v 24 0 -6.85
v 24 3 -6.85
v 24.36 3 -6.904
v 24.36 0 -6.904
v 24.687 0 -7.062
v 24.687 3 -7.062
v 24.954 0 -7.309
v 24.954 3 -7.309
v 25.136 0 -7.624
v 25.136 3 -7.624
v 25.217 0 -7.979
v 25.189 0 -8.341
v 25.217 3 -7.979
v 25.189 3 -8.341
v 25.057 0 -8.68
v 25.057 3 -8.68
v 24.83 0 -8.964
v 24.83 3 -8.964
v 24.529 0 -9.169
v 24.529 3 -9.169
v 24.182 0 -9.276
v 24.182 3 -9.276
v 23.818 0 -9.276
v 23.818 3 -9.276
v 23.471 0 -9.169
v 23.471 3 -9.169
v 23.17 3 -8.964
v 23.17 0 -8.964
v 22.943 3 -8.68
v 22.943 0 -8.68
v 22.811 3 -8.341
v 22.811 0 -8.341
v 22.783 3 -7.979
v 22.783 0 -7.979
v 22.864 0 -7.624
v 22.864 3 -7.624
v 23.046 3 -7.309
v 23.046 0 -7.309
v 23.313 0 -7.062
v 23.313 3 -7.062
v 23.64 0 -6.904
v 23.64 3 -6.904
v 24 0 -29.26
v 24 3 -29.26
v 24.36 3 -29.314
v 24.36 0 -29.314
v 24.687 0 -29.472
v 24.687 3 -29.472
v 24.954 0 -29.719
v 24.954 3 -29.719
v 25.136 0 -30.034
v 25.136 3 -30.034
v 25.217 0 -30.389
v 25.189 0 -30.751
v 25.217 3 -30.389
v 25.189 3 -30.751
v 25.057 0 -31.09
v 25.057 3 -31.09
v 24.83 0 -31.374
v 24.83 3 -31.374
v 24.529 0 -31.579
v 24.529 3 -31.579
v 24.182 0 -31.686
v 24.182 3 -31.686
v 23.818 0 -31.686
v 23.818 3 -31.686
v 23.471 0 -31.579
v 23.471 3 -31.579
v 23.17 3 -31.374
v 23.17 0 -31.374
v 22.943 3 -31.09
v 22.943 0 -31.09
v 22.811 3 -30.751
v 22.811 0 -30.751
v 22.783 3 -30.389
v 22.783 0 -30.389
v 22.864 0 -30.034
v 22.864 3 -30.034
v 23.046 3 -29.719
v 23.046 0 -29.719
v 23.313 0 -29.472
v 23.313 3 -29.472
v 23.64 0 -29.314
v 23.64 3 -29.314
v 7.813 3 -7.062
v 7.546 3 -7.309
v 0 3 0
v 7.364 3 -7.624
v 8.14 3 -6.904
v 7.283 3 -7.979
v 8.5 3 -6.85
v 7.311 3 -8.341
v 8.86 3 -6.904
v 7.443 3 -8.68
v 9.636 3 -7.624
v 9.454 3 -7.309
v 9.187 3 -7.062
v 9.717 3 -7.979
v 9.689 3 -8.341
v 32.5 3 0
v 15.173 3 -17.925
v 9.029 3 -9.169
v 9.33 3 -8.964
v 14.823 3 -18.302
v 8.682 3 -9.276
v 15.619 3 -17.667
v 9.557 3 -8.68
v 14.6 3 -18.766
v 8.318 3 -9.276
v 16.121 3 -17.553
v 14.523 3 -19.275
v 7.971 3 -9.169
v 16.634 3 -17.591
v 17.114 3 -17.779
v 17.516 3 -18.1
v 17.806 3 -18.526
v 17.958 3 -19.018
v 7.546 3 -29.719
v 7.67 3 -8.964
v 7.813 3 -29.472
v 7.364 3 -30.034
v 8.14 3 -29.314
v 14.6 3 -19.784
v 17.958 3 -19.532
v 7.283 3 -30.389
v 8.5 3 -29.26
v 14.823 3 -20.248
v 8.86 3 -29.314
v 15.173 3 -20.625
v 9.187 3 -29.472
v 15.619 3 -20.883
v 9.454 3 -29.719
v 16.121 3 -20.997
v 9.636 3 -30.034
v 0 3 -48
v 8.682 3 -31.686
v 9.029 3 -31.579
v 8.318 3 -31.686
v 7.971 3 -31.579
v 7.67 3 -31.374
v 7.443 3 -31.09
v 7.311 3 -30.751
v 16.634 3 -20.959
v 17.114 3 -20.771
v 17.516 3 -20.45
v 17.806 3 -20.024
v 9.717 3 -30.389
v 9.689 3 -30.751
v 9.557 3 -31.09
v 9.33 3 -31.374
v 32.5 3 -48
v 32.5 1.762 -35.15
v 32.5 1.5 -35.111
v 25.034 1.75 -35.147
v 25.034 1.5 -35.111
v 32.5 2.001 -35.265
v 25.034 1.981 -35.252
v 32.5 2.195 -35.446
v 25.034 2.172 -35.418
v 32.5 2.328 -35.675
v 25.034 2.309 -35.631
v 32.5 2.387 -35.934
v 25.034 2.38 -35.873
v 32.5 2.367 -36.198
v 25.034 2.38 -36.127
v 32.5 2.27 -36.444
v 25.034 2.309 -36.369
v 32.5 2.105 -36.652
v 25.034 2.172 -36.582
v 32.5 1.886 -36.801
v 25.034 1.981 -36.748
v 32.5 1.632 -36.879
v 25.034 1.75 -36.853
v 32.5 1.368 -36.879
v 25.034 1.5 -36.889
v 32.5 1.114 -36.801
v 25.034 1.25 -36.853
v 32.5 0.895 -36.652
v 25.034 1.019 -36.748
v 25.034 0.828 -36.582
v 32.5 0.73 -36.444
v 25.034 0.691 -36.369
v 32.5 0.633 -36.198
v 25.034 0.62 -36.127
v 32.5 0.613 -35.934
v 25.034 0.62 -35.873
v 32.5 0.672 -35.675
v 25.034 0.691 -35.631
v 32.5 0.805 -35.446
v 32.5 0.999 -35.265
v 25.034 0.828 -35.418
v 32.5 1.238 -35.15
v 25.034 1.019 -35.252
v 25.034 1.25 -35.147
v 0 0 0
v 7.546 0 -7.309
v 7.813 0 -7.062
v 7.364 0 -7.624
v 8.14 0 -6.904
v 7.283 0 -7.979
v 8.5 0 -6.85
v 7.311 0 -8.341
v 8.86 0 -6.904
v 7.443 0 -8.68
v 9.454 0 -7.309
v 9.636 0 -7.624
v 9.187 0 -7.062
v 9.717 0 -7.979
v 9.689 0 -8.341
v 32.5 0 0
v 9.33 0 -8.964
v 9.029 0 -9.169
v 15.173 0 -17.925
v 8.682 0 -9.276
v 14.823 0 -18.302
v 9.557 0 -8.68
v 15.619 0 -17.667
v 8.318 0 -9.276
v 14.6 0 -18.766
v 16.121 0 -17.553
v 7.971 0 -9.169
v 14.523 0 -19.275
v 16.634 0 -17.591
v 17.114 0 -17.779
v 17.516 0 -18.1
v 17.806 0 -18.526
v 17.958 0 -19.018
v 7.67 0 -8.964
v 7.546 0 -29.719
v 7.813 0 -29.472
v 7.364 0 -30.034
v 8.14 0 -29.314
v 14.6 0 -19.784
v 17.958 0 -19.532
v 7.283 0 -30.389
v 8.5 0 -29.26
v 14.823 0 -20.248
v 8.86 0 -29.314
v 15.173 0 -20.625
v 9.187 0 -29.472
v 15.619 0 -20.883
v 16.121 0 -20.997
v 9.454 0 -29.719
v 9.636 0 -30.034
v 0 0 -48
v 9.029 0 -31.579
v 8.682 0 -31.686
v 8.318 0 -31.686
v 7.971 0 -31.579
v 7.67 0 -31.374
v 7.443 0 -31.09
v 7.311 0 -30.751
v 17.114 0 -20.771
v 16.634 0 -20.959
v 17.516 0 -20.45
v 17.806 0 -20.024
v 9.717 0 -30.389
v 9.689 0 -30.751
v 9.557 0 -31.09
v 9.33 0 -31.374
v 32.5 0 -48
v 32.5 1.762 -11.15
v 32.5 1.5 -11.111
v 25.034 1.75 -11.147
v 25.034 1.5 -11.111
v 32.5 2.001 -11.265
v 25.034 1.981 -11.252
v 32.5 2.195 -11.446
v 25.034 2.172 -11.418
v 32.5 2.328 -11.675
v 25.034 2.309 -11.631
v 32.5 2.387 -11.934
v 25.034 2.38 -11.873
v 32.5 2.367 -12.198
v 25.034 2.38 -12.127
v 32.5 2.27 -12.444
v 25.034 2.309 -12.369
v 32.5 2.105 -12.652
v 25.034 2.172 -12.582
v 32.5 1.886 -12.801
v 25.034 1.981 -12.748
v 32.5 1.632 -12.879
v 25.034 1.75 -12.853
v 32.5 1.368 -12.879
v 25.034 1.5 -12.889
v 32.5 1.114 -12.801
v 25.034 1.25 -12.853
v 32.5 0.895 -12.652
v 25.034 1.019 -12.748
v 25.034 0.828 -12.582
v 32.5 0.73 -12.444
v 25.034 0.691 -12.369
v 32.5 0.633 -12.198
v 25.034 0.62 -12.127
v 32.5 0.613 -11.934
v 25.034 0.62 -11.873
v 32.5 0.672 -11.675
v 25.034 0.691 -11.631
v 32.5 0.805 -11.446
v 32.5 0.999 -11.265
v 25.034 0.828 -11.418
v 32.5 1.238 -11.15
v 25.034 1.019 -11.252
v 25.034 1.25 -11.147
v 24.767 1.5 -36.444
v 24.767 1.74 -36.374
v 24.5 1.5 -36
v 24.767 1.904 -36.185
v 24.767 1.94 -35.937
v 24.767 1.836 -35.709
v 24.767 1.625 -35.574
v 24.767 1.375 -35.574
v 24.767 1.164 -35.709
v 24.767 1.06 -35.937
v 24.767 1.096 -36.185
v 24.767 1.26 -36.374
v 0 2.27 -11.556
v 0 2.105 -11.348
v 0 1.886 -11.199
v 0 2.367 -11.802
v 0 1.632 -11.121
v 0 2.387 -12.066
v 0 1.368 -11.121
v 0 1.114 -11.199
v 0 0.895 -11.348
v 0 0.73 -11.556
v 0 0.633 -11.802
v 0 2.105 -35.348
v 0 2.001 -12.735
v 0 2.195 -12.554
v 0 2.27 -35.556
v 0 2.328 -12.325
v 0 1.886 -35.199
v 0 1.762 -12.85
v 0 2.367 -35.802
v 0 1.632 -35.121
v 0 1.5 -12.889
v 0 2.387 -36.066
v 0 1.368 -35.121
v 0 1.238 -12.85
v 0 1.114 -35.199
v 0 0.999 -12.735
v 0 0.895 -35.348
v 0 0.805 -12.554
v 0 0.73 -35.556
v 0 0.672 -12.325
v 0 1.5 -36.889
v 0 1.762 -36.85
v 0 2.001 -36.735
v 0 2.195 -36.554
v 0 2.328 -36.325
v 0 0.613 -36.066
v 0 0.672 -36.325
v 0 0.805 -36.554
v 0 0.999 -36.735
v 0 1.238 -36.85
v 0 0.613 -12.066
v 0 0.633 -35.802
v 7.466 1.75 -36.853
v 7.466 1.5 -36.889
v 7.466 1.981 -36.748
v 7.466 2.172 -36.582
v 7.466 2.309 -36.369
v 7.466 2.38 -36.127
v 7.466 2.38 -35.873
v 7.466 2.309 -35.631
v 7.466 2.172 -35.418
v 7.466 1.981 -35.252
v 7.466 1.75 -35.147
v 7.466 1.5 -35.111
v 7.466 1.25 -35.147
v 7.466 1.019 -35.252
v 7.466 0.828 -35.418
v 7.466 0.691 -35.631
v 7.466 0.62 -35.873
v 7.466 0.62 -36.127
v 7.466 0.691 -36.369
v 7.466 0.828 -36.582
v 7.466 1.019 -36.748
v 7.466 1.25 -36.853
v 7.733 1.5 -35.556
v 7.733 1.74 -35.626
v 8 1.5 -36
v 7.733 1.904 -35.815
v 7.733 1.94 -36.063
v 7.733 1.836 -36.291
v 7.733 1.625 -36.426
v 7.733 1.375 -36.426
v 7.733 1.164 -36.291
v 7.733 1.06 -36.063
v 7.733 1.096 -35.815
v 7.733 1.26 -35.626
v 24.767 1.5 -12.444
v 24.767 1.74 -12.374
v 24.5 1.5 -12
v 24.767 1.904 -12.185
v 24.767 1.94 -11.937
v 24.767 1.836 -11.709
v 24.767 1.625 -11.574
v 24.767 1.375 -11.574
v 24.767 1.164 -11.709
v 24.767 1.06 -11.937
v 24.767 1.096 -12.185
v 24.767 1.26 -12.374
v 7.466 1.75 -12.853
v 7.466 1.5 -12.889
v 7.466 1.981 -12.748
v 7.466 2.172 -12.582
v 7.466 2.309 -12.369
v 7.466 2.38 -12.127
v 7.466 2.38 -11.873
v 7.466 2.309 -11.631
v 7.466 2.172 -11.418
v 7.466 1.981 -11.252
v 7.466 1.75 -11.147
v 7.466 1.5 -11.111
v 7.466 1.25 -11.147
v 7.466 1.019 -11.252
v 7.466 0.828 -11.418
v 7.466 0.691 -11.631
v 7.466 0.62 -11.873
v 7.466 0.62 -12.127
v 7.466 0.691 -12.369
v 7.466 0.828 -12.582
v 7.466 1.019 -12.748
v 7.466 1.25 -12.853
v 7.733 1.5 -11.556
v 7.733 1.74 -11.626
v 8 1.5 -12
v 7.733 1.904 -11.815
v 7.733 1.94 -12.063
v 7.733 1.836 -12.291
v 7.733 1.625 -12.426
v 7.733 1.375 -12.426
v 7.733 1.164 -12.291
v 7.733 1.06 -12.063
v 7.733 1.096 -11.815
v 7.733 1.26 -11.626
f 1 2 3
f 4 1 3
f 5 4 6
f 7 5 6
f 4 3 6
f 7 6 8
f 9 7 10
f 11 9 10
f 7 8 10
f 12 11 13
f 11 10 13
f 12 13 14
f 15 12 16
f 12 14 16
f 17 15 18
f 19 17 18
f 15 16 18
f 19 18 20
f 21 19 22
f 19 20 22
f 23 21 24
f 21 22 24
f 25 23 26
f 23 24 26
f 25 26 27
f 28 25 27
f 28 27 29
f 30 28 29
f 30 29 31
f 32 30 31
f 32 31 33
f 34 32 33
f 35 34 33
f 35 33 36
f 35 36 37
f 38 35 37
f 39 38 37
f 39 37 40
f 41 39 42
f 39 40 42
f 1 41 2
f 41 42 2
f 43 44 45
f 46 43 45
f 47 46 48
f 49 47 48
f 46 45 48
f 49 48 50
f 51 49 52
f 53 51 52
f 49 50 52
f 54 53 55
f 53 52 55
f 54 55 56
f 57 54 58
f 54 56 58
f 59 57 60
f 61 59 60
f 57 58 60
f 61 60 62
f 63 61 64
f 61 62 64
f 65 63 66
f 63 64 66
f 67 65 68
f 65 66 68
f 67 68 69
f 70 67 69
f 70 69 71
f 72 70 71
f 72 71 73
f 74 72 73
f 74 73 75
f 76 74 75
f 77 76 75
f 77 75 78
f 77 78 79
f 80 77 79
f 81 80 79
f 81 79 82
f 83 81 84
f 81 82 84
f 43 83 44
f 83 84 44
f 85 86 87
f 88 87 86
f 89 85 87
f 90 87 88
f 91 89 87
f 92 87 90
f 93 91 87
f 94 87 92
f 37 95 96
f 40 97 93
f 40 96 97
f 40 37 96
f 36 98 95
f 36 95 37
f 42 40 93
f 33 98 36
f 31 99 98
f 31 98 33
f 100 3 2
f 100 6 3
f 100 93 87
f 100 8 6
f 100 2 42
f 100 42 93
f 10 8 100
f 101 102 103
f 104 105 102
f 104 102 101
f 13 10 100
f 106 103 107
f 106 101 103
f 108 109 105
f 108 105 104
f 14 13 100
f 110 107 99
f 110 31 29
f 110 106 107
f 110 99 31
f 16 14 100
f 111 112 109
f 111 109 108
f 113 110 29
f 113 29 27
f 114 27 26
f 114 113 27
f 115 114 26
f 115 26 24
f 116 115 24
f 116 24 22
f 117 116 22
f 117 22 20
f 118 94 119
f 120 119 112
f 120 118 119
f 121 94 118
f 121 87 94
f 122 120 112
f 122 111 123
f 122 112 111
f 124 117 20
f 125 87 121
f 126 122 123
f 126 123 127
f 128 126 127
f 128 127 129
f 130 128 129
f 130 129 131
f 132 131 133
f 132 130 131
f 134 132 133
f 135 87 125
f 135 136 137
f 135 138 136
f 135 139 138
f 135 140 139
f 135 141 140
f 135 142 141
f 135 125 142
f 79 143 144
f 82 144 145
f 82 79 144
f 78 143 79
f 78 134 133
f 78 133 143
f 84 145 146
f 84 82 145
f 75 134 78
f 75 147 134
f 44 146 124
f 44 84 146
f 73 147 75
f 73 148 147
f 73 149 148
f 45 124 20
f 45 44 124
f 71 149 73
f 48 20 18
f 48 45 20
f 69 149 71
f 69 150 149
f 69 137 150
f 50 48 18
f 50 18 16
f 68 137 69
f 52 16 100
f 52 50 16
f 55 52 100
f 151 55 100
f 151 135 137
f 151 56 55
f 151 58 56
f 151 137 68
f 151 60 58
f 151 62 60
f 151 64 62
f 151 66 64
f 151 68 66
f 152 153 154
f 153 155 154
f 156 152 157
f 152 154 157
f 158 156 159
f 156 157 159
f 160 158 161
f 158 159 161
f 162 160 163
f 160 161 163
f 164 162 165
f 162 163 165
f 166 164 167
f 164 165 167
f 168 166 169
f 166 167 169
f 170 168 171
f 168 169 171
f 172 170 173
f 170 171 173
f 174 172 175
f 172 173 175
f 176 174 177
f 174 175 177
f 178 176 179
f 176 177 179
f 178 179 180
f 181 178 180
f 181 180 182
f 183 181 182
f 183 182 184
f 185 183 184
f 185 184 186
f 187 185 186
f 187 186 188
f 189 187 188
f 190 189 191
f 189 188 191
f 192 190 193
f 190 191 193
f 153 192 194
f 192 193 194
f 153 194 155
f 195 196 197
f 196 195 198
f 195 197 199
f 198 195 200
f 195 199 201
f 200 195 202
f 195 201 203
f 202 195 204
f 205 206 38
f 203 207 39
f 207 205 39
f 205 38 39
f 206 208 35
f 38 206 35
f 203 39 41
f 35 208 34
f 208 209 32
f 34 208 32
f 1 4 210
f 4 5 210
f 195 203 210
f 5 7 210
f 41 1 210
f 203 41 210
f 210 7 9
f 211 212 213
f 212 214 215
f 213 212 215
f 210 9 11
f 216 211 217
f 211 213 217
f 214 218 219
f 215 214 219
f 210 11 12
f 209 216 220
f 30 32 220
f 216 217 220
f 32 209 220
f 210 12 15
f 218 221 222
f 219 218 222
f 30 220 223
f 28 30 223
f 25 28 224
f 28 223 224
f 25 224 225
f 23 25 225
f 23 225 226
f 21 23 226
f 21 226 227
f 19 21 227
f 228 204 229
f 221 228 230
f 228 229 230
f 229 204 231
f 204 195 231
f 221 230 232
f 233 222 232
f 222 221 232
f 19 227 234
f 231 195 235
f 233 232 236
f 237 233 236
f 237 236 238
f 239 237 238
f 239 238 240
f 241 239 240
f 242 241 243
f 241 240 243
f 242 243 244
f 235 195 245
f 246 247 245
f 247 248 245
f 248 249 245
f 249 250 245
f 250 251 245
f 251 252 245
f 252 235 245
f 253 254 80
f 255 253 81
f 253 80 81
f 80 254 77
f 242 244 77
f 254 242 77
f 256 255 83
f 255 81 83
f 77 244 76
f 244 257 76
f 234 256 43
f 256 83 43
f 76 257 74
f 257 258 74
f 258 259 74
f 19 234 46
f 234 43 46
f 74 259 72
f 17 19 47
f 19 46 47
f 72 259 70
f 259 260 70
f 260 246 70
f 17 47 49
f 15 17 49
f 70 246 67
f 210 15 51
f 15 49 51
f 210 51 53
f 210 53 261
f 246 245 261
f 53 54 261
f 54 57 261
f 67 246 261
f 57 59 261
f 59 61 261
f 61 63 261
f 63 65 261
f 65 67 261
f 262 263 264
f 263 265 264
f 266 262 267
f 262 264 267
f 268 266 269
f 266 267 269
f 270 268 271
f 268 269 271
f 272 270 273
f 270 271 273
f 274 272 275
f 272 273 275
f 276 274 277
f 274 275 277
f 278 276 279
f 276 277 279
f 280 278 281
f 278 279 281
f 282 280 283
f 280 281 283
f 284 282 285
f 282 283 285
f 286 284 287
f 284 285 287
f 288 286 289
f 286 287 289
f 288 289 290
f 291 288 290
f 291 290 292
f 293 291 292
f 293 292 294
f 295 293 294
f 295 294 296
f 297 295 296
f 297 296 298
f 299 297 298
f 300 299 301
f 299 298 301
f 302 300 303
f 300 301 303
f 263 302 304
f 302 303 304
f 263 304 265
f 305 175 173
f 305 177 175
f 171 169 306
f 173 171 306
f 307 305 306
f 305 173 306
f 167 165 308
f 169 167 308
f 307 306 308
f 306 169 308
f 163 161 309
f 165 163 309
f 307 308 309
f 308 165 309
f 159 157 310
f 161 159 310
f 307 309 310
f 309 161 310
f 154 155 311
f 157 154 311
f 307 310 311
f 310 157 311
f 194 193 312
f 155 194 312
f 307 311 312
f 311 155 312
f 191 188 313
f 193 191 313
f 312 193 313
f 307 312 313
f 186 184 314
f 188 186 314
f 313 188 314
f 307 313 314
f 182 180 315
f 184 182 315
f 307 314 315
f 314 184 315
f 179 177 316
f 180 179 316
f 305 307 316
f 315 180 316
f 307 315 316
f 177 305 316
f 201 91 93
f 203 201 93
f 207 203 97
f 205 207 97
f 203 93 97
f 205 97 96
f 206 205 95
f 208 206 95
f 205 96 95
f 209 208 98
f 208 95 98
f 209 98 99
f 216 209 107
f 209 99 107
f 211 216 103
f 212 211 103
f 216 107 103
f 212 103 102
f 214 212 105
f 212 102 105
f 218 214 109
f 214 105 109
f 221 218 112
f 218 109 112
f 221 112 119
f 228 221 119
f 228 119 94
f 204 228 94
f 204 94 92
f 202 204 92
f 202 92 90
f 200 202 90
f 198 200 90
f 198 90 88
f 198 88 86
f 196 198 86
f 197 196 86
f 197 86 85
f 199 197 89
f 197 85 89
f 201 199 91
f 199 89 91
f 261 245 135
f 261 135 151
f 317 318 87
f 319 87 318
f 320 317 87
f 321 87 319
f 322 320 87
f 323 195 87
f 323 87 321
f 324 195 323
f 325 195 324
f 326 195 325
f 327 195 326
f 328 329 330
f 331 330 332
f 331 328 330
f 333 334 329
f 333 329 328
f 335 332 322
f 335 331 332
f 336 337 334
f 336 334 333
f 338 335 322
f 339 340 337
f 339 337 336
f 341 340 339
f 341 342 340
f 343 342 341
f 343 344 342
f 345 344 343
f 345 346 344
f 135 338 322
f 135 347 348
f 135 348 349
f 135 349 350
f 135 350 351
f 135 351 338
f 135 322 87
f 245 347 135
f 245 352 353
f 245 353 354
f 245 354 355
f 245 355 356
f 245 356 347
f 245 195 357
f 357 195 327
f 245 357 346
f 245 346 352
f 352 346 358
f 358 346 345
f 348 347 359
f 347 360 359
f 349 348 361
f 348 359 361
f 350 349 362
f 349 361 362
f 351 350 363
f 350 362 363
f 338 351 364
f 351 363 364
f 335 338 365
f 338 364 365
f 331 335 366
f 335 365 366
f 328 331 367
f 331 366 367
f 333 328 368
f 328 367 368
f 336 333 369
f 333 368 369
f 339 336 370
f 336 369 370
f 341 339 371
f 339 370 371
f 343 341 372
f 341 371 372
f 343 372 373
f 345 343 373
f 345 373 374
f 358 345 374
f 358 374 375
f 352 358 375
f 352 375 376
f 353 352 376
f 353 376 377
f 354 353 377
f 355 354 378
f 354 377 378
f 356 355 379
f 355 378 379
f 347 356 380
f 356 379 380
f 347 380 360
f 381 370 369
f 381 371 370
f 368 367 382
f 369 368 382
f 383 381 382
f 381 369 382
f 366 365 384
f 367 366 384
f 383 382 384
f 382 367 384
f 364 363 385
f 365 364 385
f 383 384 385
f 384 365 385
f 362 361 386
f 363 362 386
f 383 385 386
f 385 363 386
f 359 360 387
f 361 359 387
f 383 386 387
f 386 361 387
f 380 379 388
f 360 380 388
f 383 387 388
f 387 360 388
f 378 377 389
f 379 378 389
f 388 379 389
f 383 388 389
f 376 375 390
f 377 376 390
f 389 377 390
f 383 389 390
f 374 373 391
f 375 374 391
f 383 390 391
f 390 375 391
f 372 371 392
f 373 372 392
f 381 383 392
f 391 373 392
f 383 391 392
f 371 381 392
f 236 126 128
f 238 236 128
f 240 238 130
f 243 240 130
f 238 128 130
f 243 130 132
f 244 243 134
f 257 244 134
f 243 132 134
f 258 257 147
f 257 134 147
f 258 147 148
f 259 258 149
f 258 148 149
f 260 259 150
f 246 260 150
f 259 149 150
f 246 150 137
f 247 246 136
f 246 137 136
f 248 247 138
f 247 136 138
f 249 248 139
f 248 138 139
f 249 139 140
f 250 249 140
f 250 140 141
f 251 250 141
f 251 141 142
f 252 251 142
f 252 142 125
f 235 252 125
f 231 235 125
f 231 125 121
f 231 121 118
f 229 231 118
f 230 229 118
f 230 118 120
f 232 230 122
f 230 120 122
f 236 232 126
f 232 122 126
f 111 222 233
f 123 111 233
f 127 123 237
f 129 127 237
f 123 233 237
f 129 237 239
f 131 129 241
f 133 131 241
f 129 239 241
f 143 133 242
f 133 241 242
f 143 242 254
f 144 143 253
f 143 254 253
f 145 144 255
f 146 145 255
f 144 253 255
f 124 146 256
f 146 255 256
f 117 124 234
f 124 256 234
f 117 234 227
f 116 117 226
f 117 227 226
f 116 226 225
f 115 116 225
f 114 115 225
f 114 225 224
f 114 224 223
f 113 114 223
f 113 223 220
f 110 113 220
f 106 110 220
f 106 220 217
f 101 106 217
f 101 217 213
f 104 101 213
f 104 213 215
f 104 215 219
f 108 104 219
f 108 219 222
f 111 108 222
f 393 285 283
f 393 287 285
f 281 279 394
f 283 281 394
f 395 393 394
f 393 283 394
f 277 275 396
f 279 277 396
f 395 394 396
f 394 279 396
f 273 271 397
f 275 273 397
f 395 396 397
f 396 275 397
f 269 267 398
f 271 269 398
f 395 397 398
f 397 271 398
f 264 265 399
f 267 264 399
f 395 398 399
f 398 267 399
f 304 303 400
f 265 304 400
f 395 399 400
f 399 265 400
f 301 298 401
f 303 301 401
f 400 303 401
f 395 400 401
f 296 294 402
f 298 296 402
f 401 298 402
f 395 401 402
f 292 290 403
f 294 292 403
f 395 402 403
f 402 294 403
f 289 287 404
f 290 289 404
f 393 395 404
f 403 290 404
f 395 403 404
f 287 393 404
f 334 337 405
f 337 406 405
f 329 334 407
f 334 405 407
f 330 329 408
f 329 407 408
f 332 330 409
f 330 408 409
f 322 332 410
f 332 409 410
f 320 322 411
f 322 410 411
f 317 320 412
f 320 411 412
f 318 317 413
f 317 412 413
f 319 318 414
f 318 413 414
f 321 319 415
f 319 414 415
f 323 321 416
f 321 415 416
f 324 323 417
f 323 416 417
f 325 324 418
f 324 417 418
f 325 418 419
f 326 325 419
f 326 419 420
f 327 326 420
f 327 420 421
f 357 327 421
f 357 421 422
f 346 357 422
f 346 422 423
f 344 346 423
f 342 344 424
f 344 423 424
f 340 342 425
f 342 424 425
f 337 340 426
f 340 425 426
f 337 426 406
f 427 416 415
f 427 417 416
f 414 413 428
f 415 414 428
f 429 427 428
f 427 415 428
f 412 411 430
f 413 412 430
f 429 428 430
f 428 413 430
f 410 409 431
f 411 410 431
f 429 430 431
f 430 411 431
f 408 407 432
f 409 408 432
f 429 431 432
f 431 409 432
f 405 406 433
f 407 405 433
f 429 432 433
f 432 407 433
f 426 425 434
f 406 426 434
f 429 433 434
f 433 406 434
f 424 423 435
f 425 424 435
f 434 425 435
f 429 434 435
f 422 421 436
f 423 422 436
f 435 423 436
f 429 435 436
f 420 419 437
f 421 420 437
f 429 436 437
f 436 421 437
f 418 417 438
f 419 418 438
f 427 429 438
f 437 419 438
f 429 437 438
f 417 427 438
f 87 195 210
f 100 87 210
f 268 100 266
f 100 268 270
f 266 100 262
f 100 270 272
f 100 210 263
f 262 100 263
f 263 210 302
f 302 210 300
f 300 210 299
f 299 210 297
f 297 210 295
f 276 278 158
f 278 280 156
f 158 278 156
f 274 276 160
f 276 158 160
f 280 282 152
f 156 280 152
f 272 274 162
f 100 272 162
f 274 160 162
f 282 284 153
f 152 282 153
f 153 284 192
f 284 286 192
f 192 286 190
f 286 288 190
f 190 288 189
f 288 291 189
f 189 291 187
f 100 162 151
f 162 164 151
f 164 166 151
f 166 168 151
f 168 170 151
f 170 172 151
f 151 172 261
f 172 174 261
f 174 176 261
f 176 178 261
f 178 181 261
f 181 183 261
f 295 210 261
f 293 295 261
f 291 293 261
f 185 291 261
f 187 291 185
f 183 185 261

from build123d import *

# Parameters (mm, degrees)
SKETCH1_W                 = 32.5
SKETCH1_H                 = 48
BOSS_EXTRUDE1_DEPTH       = 3
F_2_56_TAPPED_HOLE1_D     = 1.778
F_2_56_TAPPED_HOLE1_DEPTH = 7.46583491
F_2_56_TAPPED_HOLE1_TIP   = 0.53416509
F_2_56_TAPPED_HOLE2_D     = 1.778
F_2_56_TAPPED_HOLE2_DEPTH = 7.46583491
F_2_56_TAPPED_HOLE2_TIP   = 0.53416509
F_8_32_TAPPED_HOLE1_D     = 3.4544
F_8_32_TAPPED_HOLE1_DEPTH = 9.672193539
F_8_32_TAPPED_HOLE1_TIP   = 1.037806461
SKETCH16_R                = 1.22
CUT_EXTRUDE4_DEPTH        = 3


with BuildPart() as part:
    # Sketch1 → Boss-Extrude1 (new body)
    with BuildSketch(Plane(origin=(0, 0, 0), x_dir=(1, 0, 0), z_dir=(0, 1, 0))):
        with Locations((16.25, 24)):
            Rectangle(SKETCH1_W, SKETCH1_H)
    extrude(amount=BOSS_EXTRUDE1_DEPTH)

    # #2-56 Tapped Hole1
    with Locations(Plane.ZY):
        with Locations((-36, 1.5), (-12, 1.5)):
            Hole(F_2_56_TAPPED_HOLE1_D / 2, depth=F_2_56_TAPPED_HOLE1_DEPTH)
            with Locations((0, 0, -(F_2_56_TAPPED_HOLE1_DEPTH + F_2_56_TAPPED_HOLE1_TIP / 2))):  # 118° drill point
                Cone(0, F_2_56_TAPPED_HOLE1_D / 2, F_2_56_TAPPED_HOLE1_TIP, mode=Mode.SUBTRACT)

    # #2-56 Tapped Hole2
    with Locations(Plane(origin=(32.5, 0, 0), x_dir=(0, 0, -1), z_dir=(1, 0, 0))):
        with Locations((12, 1.5), (36, 1.5)):
            Hole(F_2_56_TAPPED_HOLE2_D / 2, depth=F_2_56_TAPPED_HOLE2_DEPTH)
            with Locations((0, 0, -(F_2_56_TAPPED_HOLE2_DEPTH + F_2_56_TAPPED_HOLE2_TIP / 2))):  # 118° drill point
                Cone(0, F_2_56_TAPPED_HOLE2_D / 2, F_2_56_TAPPED_HOLE2_TIP, mode=Mode.SUBTRACT)

    # #8-32 Tapped Hole1
    with Locations(Plane(origin=(0, 3, 0), x_dir=(1, 0, 0), z_dir=(0, 1, 0))):
        with Locations((16.25, 19.275)):
            Hole(F_8_32_TAPPED_HOLE1_D / 2, depth=F_8_32_TAPPED_HOLE1_DEPTH)
            with Locations((0, 0, -(F_8_32_TAPPED_HOLE1_DEPTH + F_8_32_TAPPED_HOLE1_TIP / 2))):  # 118° drill point
                Cone(0, F_8_32_TAPPED_HOLE1_D / 2, F_8_32_TAPPED_HOLE1_TIP, mode=Mode.SUBTRACT)

    # Sketch16 → Cut-Extrude4 (cut)
    with BuildSketch(Plane(origin=(0, 3, 0), x_dir=(1, 0, 0), z_dir=(0, 1, 0))):
        with Locations(Location((8.5, 30.48, 0), (0, 0, 270))):
            Circle(SKETCH16_R)
        with Locations(Location((24, 30.48, 0), (0, 0, 270))):
            Circle(SKETCH16_R)
        with Locations(Location((8.5, 8.07, 0), (0, 0, 270))):
            Circle(SKETCH16_R)
        with Locations(Location((24, 8.07, 0), (0, 0, 270))):
            Circle(SKETCH16_R)
    extrude(amount=-CUT_EXTRUDE4_DEPTH, mode=Mode.SUBTRACT)


solid = part.part
